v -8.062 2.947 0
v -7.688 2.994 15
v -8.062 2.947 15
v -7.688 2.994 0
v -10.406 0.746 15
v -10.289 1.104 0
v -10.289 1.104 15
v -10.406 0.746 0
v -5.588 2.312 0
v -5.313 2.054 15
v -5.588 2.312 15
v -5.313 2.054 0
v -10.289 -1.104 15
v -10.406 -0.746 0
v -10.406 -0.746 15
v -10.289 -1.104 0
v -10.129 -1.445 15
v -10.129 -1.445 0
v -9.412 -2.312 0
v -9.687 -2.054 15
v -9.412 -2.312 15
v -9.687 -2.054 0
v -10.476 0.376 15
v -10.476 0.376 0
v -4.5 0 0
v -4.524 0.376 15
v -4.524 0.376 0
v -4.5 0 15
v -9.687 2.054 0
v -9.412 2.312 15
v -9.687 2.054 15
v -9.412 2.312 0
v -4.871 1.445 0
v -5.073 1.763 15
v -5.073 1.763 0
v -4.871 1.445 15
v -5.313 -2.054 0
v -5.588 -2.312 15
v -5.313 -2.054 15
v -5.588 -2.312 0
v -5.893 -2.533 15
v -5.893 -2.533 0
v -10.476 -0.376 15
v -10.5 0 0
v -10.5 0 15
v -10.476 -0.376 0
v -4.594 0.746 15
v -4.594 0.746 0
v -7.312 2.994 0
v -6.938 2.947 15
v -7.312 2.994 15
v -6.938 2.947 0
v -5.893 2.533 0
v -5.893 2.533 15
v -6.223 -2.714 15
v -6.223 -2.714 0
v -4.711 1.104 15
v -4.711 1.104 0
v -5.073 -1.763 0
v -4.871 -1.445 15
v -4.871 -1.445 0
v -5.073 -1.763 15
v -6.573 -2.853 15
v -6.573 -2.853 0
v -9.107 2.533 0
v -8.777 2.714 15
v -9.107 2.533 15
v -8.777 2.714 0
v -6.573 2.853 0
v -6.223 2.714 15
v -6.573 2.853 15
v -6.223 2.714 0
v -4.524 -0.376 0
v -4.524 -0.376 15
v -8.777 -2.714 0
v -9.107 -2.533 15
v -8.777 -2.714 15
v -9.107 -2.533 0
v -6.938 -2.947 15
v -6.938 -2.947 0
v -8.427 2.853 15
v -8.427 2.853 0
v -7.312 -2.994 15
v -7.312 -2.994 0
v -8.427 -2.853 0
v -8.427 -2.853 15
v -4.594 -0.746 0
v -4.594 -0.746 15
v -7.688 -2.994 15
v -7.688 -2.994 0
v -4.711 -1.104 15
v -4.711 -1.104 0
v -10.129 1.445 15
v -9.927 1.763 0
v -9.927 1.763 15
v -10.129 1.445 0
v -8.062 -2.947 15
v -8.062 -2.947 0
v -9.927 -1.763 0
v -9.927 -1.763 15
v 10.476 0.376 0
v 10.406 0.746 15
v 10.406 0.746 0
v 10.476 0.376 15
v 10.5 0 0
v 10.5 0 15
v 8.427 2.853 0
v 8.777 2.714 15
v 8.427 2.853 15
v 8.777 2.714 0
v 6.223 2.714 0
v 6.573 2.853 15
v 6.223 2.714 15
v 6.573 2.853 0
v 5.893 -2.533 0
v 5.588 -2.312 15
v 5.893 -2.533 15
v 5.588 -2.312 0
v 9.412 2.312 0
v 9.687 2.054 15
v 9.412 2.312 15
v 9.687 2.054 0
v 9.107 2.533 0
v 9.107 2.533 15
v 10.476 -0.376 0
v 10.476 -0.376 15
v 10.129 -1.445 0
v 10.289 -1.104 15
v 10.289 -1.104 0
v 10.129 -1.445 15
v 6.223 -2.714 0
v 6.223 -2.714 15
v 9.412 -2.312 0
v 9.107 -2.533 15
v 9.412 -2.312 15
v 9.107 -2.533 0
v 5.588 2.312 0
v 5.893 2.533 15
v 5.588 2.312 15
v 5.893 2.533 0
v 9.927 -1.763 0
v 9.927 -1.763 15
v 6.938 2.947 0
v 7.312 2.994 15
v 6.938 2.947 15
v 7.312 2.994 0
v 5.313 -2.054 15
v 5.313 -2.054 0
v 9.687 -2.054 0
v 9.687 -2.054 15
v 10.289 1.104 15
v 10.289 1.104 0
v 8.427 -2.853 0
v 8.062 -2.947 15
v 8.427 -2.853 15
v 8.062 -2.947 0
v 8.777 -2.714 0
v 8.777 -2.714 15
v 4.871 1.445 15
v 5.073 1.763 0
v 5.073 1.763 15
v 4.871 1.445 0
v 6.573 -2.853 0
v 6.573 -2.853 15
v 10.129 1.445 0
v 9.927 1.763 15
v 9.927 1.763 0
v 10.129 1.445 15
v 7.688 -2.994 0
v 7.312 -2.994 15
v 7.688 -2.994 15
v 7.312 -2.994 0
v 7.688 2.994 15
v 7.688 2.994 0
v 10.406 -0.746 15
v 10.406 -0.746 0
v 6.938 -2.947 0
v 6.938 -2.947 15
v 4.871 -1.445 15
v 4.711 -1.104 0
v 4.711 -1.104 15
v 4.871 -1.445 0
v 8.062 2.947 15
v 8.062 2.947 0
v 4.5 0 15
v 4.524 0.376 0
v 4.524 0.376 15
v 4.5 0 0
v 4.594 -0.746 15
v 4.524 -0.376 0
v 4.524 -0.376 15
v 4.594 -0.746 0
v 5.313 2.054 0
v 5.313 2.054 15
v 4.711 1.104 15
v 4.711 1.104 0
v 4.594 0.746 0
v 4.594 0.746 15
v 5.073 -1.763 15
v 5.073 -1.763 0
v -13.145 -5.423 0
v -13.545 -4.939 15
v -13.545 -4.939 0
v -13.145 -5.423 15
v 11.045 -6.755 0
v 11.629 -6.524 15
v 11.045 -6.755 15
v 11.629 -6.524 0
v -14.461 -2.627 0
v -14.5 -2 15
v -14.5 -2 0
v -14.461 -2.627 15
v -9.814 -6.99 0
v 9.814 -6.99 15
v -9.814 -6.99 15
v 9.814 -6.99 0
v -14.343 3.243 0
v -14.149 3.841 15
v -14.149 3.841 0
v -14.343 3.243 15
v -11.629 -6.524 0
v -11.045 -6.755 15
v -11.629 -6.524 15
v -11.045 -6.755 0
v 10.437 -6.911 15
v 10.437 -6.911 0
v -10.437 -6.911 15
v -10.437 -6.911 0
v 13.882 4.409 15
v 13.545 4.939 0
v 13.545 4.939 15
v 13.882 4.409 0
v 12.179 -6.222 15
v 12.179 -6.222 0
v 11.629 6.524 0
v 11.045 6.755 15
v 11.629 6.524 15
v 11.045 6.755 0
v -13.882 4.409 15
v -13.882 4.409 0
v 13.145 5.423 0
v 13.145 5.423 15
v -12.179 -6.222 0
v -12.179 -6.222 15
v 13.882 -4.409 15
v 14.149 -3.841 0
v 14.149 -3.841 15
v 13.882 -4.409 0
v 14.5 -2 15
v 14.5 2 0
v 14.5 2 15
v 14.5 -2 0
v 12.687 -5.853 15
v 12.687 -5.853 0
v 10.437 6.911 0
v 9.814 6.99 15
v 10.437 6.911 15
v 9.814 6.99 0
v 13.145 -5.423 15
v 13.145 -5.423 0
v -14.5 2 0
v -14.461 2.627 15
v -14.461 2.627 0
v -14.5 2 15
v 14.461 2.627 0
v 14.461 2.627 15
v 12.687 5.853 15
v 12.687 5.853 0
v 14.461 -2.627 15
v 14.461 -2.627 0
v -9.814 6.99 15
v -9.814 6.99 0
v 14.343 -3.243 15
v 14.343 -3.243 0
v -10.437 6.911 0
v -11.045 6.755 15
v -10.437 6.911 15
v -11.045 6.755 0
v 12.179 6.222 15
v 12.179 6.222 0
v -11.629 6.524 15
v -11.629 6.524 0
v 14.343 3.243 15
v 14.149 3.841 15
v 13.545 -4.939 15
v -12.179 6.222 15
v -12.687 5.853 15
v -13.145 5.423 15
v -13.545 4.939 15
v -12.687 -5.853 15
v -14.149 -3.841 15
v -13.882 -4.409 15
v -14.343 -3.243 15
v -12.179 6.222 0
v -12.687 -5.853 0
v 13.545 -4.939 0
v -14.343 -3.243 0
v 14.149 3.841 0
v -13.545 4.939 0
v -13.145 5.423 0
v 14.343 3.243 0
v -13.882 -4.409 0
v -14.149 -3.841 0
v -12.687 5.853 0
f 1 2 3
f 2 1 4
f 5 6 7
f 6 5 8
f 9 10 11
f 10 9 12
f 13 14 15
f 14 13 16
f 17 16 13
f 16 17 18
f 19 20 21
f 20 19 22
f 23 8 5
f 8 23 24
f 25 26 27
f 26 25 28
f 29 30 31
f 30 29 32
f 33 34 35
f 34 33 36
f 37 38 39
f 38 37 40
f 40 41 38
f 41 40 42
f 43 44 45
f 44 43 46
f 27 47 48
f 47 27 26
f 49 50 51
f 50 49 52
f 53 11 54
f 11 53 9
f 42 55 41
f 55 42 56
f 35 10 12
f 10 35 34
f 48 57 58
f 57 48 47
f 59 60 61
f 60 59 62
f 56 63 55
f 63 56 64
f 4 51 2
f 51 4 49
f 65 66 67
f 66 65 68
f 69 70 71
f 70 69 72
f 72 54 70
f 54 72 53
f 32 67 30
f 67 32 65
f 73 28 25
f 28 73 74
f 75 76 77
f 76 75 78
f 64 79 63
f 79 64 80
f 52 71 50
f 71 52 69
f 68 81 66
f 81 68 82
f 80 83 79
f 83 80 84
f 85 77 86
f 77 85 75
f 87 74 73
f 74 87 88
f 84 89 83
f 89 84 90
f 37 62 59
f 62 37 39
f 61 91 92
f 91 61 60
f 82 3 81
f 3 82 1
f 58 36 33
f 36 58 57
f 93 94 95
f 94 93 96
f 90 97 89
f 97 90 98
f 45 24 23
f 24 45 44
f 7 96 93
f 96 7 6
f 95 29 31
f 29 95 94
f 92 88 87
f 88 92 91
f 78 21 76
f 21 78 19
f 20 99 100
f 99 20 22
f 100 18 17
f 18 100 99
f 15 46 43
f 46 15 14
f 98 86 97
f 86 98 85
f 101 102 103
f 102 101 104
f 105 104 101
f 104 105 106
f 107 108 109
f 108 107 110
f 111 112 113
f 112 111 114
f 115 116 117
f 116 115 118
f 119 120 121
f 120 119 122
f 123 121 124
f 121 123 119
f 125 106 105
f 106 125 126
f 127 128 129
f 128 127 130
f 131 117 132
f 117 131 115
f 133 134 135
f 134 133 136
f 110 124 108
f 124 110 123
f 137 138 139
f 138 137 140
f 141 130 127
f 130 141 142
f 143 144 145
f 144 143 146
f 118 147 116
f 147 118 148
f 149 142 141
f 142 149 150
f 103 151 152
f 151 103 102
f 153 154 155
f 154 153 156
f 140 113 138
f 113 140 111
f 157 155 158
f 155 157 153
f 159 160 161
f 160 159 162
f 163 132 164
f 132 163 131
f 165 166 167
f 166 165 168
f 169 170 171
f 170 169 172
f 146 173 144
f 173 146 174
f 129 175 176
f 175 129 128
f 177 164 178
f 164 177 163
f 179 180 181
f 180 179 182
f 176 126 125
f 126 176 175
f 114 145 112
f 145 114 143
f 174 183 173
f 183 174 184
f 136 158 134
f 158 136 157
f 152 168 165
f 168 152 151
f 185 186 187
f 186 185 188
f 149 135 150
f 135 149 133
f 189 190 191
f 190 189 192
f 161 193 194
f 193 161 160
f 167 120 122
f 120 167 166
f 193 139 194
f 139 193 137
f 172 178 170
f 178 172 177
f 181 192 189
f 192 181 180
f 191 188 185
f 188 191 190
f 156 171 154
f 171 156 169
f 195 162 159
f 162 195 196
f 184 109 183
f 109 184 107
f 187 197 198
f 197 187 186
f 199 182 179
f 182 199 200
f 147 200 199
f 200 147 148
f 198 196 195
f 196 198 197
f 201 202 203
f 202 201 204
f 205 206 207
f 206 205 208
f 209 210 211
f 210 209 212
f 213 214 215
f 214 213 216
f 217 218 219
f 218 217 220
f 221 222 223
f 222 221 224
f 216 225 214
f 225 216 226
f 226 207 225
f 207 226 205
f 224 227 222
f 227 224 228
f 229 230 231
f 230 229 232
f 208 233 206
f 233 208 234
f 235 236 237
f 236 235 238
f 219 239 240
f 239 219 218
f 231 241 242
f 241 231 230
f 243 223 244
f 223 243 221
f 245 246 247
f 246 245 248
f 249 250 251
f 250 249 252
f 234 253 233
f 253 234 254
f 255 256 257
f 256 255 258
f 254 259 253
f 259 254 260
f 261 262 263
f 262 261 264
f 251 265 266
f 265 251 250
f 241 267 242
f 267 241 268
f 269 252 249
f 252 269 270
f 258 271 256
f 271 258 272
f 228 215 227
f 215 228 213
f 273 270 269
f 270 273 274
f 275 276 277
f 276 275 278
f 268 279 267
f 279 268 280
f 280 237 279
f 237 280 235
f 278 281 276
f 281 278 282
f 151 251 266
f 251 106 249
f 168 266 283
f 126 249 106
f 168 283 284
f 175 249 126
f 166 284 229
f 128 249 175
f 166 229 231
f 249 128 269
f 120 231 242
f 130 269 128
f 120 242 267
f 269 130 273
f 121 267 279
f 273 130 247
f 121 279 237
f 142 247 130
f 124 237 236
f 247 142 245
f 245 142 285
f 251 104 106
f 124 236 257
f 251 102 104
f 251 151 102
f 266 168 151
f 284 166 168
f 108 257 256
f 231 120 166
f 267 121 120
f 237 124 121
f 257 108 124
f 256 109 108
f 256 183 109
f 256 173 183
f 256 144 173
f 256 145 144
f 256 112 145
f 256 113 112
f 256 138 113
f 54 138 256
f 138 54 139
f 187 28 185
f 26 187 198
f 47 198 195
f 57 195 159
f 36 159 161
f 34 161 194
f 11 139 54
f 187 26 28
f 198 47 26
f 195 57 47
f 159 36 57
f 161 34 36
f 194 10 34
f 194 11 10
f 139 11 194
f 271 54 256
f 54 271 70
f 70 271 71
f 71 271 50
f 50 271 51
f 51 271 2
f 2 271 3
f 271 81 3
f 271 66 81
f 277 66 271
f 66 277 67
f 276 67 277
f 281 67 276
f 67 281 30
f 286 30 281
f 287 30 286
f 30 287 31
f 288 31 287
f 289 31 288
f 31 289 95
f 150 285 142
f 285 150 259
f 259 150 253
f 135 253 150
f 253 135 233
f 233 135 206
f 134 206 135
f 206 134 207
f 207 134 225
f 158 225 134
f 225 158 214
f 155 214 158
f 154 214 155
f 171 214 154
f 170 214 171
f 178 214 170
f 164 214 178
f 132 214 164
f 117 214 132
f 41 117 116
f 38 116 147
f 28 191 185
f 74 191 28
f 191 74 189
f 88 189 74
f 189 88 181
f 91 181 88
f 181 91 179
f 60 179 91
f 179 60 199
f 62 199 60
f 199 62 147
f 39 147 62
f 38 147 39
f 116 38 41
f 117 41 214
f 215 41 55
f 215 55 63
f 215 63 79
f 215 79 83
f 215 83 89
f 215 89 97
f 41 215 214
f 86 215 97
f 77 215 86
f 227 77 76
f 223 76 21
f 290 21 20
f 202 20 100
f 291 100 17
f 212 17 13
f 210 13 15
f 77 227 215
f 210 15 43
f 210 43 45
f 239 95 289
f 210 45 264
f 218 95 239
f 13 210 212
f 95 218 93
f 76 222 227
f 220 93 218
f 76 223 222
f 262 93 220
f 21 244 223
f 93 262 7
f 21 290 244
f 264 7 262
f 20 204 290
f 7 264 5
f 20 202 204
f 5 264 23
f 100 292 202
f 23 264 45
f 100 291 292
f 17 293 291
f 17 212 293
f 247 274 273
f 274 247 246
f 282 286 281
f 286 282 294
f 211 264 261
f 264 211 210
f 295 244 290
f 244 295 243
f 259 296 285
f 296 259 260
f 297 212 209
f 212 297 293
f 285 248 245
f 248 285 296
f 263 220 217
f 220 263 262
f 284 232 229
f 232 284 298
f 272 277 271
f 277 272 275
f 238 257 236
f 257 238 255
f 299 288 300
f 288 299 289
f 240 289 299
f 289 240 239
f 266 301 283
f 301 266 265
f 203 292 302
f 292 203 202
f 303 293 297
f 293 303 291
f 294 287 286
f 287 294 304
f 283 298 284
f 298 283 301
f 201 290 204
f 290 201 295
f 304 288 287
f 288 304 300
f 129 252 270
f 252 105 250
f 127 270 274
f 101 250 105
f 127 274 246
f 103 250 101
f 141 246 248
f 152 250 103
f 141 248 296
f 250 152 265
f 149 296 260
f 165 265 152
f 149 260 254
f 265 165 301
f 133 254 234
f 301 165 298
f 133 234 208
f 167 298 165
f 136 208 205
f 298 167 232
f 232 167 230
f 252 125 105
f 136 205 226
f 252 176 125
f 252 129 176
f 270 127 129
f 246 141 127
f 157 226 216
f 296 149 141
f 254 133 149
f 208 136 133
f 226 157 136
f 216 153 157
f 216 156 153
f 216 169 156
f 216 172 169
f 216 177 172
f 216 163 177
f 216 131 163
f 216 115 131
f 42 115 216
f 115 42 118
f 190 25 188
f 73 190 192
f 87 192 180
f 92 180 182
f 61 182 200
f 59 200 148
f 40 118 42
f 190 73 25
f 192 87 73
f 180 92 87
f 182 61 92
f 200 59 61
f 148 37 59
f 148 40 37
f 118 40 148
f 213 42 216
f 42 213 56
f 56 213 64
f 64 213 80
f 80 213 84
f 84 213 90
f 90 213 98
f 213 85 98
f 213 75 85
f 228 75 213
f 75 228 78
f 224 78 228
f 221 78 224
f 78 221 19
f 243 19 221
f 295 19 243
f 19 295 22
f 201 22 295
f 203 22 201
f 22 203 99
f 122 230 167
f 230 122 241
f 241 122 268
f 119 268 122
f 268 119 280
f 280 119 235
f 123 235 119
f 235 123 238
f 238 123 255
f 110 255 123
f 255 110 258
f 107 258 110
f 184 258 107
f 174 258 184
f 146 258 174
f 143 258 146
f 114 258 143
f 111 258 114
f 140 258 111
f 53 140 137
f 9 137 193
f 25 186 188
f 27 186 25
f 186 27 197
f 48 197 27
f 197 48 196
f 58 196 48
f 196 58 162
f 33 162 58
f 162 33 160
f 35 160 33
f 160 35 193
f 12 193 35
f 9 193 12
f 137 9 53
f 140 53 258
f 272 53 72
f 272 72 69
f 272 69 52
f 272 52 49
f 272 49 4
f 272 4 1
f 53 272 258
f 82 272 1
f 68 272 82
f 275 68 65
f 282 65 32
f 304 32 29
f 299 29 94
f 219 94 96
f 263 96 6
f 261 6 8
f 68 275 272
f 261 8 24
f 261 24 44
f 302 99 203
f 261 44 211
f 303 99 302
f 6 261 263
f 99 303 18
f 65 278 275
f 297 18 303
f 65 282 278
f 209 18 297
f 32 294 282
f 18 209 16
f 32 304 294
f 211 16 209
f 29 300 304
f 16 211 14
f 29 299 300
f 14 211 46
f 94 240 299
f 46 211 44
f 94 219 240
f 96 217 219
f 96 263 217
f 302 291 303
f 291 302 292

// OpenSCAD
$fn = 50;


difference() {
	union() {
		hull() {
			translate(v = [-9.5000000000, 2.0000000000, 0]) {
				cylinder(h = 15, r = 5);
			}
			translate(v = [9.5000000000, 2.0000000000, 0]) {
				cylinder(h = 15, r = 5);
			}
			translate(v = [-9.5000000000, -2.0000000000, 0]) {
				cylinder(h = 15, r = 5);
			}
			translate(v = [9.5000000000, -2.0000000000, 0]) {
				cylinder(h = 15, r = 5);
			}
		}
	}
	union() {
		translate(v = [-7.5000000000, 0.0000000000, -100.0000000000]) {
			cylinder(h = 200, r = 3.0000000000);
		}
		translate(v = [-7.5000000000, 0.0000000000, -100.0000000000]) {
			cylinder(h = 200, r = 3.0000000000);
		}
		translate(v = [7.5000000000, 0.0000000000, -100.0000000000]) {
			cylinder(h = 200, r = 3.0000000000);
		}
		translate(v = [7.5000000000, 0.0000000000, -100.0000000000]) {
			cylinder(h = 200, r = 3.0000000000);
		}
	}
}
